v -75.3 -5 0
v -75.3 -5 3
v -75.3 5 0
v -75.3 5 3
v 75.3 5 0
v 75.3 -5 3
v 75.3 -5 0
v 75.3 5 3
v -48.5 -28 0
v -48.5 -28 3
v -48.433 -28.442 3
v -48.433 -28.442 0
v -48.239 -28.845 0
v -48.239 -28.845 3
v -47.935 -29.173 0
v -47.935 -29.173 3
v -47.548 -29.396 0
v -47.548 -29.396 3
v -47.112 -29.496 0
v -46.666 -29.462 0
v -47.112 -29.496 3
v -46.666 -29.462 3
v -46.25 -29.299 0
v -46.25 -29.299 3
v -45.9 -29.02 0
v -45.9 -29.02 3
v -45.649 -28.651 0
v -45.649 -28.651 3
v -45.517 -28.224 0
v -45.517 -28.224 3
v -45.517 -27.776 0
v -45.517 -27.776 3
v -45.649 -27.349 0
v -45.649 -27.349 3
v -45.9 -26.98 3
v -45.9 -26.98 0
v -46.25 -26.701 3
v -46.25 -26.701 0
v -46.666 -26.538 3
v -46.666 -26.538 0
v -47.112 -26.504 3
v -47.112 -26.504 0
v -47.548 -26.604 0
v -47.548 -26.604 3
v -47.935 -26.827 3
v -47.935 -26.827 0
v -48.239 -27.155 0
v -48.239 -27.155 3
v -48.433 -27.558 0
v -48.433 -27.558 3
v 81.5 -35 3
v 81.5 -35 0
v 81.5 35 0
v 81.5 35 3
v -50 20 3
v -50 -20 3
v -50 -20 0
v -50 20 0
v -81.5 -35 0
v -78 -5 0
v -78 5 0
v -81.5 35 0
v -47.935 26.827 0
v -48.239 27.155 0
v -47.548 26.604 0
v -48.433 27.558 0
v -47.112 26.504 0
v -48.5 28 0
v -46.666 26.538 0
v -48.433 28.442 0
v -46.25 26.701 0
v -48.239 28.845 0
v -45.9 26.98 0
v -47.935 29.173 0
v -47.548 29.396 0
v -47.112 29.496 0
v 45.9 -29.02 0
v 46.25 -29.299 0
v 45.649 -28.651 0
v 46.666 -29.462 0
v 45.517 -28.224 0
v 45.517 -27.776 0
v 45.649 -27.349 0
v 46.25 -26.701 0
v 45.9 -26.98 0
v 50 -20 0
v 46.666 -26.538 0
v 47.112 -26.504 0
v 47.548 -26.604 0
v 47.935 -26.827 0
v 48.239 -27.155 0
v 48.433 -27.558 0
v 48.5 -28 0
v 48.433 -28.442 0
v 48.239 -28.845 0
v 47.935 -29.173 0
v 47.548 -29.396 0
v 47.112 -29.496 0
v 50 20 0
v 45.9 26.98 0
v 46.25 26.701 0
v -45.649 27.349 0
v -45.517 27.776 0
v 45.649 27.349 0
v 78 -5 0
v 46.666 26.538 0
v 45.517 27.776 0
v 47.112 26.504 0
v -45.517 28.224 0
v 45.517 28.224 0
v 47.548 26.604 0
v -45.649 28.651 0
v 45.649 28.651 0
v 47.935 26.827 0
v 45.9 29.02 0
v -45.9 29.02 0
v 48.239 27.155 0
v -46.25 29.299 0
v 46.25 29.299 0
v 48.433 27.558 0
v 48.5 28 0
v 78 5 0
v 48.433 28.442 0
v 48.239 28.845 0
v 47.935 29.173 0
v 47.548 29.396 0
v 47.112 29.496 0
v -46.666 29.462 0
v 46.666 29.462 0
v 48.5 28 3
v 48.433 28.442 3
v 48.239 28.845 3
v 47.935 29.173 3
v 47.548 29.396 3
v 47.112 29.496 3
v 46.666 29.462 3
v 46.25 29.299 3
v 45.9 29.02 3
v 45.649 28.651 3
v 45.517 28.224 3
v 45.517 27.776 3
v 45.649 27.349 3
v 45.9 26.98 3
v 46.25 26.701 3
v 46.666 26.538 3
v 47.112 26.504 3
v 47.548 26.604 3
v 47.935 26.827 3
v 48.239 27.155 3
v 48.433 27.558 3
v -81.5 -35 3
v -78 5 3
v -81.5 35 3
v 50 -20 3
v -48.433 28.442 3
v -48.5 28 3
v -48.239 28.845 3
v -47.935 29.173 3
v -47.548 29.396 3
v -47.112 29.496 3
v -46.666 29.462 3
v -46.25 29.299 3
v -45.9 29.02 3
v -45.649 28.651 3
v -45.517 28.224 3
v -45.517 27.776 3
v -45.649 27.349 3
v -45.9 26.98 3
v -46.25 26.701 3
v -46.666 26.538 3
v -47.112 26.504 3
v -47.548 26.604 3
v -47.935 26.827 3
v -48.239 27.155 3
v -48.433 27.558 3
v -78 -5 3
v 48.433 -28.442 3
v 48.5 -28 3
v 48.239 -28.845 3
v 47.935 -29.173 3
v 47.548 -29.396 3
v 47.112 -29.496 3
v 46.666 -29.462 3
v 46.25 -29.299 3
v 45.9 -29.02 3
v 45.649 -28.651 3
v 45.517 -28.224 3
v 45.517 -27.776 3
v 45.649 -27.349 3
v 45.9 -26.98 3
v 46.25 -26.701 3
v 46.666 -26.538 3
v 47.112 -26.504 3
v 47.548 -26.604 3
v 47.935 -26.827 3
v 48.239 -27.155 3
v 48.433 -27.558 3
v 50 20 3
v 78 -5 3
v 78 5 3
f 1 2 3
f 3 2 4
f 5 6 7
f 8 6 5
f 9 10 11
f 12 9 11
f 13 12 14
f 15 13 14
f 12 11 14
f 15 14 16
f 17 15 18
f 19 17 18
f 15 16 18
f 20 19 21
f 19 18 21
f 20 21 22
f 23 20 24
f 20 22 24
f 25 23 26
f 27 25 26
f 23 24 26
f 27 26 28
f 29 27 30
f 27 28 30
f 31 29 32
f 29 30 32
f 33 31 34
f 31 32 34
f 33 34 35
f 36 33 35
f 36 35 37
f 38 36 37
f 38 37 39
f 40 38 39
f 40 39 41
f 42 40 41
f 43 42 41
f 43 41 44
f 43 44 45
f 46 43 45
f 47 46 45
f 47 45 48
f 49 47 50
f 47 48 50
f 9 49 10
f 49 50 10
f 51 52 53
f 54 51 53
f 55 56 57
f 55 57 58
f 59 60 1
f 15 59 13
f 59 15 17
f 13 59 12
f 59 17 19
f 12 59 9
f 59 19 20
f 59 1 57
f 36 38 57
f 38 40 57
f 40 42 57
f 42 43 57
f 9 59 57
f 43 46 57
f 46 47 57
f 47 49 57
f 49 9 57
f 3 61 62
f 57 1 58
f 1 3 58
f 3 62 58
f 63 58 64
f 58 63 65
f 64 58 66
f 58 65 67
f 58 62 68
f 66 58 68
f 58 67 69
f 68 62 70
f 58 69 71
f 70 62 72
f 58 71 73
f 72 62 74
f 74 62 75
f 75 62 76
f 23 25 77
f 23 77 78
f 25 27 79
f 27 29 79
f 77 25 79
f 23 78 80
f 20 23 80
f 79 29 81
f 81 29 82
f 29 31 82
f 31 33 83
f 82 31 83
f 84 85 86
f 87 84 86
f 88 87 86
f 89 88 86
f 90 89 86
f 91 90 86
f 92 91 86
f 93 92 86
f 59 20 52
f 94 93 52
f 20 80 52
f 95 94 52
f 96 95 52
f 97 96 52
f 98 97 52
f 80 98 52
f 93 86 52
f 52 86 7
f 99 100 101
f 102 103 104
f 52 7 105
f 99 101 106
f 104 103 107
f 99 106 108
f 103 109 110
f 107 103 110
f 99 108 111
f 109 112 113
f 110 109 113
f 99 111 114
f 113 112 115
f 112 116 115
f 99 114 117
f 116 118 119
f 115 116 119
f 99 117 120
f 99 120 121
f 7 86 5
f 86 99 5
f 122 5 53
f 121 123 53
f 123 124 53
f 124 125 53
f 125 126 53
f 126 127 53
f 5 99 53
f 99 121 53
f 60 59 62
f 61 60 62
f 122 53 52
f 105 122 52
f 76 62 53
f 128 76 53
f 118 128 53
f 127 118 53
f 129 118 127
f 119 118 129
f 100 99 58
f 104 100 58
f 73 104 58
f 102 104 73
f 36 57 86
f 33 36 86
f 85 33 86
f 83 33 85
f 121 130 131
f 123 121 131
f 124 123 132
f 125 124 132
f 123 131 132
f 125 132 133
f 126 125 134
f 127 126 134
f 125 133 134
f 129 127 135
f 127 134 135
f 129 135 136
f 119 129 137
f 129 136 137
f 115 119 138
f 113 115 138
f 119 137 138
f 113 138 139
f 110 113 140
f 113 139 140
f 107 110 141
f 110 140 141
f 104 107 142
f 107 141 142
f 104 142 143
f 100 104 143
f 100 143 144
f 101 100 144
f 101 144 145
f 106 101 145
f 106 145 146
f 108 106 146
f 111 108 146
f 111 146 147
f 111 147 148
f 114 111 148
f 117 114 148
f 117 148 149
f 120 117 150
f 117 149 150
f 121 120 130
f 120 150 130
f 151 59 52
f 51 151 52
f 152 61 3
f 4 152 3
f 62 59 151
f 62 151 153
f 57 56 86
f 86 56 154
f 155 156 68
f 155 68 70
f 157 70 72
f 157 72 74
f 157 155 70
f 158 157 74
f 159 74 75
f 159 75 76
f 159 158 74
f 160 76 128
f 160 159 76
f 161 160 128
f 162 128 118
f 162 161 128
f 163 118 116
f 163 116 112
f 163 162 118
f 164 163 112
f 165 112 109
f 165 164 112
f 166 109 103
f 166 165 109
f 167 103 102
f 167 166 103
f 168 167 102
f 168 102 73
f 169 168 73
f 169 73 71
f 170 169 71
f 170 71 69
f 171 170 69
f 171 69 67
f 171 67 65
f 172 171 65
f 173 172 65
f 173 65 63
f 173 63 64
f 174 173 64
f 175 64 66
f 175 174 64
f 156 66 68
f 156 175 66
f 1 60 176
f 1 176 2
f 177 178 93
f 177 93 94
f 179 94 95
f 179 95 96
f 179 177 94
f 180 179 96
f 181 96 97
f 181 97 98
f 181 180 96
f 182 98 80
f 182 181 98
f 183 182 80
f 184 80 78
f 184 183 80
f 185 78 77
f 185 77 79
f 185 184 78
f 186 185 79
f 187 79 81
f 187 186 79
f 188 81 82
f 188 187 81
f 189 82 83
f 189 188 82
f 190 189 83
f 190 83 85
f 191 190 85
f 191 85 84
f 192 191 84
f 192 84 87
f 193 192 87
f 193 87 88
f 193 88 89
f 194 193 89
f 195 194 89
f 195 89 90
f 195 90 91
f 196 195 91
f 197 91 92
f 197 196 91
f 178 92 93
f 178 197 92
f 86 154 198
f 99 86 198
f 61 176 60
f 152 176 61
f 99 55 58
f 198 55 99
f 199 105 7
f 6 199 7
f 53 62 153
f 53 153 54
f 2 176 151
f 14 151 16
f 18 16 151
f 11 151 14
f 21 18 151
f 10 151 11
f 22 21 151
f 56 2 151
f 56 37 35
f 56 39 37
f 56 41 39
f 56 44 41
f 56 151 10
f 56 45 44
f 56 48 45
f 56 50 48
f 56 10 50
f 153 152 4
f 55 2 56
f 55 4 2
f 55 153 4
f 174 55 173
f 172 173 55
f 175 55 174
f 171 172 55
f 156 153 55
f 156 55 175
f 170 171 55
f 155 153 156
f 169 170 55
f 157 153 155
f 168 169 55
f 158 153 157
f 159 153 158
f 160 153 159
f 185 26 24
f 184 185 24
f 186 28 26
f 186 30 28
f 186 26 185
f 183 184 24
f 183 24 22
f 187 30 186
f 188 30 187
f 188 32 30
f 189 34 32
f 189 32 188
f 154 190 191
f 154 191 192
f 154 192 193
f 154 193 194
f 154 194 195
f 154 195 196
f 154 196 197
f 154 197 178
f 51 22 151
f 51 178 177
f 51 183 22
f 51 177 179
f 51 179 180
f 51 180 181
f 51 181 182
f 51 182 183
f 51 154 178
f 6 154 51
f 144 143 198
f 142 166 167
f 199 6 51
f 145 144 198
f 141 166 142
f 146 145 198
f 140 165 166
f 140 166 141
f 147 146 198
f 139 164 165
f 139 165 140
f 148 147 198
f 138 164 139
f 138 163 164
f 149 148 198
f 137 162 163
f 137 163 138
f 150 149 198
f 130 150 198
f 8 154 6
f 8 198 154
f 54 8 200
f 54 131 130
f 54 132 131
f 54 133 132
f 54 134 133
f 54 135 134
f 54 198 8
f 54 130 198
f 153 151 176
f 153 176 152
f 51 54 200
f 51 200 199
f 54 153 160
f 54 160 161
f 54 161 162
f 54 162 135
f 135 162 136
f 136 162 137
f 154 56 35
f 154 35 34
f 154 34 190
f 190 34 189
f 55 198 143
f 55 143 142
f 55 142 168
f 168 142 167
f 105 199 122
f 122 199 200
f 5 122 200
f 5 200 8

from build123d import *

# Parameters (mm, degrees)
SKETCH1_W               = 163
SKETCH1_H               = 70
BOSS_EXTRUDE1_DEPTH     = 3
SKETCH2_W               = 2.7
SKETCH2_H               = 10
CUT_EXTRUDE1_DEPTH      = 3
CUT_EXTRUDE2_REACH      = 5
SKETCH3_W               = 100
SKETCH3_H               = 40
SKETCH4_R               = 1.5
CUT_EXTRUDE3_DEPTH      = 3
MIRROR3_COPY_1_SKETCH_R = 1.5
MIRROR3_COPY_1_DEPTH    = 3


with BuildPart() as part:
    # Sketch1 → Boss-Extrude1 (new body)
    with BuildSketch(Plane.XY):
        Rectangle(SKETCH1_W, SKETCH1_H)
    extrude(amount=BOSS_EXTRUDE1_DEPTH)

    # Sketch2 → Cut-Extrude1 (cut)
    with BuildSketch(Plane.XY.offset(3)):
        with Locations((-76.65, 0)):
            Rectangle(SKETCH2_W, SKETCH2_H)
    cut_extrude1 = extrude(amount=-CUT_EXTRUDE1_DEPTH, mode=Mode.SUBTRACT)

    # Mirror1: Cut-Extrude1 across plane
    add(cut_extrude1.mirror(Plane(origin=(0, 0, 0), x_dir=(0, 0, 1), z_dir=(1, 0, 0))), mode=Mode.SUBTRACT)

    # Sketch3 → Cut-Extrude2 (cut, up to next)
    with BuildSketch(Plane.XY.offset(3), mode=Mode.PRIVATE) as cut_extrude2_sk1:
        Rectangle(SKETCH3_W, SKETCH3_H)
    cut_extrude2_tool1 = extrude(cut_extrude2_sk1.sketch, amount=-CUT_EXTRUDE2_REACH, mode=Mode.PRIVATE) & part.part
    add(cut_extrude2_tool1.solids().sort_by_distance((0, 0, 3))[0], mode=Mode.SUBTRACT)

    # Sketch4 → Cut-Extrude3 (cut)
    with BuildSketch(Plane.XY.offset(3)):
        with Locations((47, 28)):
            Circle(SKETCH4_R)
    cut_extrude3 = extrude(amount=-CUT_EXTRUDE3_DEPTH, mode=Mode.SUBTRACT)

    # Mirror2: Cut-Extrude3 across plane
    add(cut_extrude3.mirror(Plane(origin=(0, 0, 0), x_dir=(0, 0, 1), z_dir=(1, 0, 0))), mode=Mode.SUBTRACT)

    # Mirror3: Cut-Extrude3 across plane
    add(cut_extrude3.mirror(Plane.ZX), mode=Mode.SUBTRACT)

    # Mirror3 copy 1 sketch → Mirror3 copy 1 (cut)
    with BuildSketch(Plane(origin=(0, 0, 3), x_dir=(-1, 0, 0), z_dir=(0, 0, 1))):
        with Locations((47, 28)):
            Circle(MIRROR3_COPY_1_SKETCH_R)
    extrude(amount=-MIRROR3_COPY_1_DEPTH, mode=Mode.SUBTRACT)


solid = part.part
